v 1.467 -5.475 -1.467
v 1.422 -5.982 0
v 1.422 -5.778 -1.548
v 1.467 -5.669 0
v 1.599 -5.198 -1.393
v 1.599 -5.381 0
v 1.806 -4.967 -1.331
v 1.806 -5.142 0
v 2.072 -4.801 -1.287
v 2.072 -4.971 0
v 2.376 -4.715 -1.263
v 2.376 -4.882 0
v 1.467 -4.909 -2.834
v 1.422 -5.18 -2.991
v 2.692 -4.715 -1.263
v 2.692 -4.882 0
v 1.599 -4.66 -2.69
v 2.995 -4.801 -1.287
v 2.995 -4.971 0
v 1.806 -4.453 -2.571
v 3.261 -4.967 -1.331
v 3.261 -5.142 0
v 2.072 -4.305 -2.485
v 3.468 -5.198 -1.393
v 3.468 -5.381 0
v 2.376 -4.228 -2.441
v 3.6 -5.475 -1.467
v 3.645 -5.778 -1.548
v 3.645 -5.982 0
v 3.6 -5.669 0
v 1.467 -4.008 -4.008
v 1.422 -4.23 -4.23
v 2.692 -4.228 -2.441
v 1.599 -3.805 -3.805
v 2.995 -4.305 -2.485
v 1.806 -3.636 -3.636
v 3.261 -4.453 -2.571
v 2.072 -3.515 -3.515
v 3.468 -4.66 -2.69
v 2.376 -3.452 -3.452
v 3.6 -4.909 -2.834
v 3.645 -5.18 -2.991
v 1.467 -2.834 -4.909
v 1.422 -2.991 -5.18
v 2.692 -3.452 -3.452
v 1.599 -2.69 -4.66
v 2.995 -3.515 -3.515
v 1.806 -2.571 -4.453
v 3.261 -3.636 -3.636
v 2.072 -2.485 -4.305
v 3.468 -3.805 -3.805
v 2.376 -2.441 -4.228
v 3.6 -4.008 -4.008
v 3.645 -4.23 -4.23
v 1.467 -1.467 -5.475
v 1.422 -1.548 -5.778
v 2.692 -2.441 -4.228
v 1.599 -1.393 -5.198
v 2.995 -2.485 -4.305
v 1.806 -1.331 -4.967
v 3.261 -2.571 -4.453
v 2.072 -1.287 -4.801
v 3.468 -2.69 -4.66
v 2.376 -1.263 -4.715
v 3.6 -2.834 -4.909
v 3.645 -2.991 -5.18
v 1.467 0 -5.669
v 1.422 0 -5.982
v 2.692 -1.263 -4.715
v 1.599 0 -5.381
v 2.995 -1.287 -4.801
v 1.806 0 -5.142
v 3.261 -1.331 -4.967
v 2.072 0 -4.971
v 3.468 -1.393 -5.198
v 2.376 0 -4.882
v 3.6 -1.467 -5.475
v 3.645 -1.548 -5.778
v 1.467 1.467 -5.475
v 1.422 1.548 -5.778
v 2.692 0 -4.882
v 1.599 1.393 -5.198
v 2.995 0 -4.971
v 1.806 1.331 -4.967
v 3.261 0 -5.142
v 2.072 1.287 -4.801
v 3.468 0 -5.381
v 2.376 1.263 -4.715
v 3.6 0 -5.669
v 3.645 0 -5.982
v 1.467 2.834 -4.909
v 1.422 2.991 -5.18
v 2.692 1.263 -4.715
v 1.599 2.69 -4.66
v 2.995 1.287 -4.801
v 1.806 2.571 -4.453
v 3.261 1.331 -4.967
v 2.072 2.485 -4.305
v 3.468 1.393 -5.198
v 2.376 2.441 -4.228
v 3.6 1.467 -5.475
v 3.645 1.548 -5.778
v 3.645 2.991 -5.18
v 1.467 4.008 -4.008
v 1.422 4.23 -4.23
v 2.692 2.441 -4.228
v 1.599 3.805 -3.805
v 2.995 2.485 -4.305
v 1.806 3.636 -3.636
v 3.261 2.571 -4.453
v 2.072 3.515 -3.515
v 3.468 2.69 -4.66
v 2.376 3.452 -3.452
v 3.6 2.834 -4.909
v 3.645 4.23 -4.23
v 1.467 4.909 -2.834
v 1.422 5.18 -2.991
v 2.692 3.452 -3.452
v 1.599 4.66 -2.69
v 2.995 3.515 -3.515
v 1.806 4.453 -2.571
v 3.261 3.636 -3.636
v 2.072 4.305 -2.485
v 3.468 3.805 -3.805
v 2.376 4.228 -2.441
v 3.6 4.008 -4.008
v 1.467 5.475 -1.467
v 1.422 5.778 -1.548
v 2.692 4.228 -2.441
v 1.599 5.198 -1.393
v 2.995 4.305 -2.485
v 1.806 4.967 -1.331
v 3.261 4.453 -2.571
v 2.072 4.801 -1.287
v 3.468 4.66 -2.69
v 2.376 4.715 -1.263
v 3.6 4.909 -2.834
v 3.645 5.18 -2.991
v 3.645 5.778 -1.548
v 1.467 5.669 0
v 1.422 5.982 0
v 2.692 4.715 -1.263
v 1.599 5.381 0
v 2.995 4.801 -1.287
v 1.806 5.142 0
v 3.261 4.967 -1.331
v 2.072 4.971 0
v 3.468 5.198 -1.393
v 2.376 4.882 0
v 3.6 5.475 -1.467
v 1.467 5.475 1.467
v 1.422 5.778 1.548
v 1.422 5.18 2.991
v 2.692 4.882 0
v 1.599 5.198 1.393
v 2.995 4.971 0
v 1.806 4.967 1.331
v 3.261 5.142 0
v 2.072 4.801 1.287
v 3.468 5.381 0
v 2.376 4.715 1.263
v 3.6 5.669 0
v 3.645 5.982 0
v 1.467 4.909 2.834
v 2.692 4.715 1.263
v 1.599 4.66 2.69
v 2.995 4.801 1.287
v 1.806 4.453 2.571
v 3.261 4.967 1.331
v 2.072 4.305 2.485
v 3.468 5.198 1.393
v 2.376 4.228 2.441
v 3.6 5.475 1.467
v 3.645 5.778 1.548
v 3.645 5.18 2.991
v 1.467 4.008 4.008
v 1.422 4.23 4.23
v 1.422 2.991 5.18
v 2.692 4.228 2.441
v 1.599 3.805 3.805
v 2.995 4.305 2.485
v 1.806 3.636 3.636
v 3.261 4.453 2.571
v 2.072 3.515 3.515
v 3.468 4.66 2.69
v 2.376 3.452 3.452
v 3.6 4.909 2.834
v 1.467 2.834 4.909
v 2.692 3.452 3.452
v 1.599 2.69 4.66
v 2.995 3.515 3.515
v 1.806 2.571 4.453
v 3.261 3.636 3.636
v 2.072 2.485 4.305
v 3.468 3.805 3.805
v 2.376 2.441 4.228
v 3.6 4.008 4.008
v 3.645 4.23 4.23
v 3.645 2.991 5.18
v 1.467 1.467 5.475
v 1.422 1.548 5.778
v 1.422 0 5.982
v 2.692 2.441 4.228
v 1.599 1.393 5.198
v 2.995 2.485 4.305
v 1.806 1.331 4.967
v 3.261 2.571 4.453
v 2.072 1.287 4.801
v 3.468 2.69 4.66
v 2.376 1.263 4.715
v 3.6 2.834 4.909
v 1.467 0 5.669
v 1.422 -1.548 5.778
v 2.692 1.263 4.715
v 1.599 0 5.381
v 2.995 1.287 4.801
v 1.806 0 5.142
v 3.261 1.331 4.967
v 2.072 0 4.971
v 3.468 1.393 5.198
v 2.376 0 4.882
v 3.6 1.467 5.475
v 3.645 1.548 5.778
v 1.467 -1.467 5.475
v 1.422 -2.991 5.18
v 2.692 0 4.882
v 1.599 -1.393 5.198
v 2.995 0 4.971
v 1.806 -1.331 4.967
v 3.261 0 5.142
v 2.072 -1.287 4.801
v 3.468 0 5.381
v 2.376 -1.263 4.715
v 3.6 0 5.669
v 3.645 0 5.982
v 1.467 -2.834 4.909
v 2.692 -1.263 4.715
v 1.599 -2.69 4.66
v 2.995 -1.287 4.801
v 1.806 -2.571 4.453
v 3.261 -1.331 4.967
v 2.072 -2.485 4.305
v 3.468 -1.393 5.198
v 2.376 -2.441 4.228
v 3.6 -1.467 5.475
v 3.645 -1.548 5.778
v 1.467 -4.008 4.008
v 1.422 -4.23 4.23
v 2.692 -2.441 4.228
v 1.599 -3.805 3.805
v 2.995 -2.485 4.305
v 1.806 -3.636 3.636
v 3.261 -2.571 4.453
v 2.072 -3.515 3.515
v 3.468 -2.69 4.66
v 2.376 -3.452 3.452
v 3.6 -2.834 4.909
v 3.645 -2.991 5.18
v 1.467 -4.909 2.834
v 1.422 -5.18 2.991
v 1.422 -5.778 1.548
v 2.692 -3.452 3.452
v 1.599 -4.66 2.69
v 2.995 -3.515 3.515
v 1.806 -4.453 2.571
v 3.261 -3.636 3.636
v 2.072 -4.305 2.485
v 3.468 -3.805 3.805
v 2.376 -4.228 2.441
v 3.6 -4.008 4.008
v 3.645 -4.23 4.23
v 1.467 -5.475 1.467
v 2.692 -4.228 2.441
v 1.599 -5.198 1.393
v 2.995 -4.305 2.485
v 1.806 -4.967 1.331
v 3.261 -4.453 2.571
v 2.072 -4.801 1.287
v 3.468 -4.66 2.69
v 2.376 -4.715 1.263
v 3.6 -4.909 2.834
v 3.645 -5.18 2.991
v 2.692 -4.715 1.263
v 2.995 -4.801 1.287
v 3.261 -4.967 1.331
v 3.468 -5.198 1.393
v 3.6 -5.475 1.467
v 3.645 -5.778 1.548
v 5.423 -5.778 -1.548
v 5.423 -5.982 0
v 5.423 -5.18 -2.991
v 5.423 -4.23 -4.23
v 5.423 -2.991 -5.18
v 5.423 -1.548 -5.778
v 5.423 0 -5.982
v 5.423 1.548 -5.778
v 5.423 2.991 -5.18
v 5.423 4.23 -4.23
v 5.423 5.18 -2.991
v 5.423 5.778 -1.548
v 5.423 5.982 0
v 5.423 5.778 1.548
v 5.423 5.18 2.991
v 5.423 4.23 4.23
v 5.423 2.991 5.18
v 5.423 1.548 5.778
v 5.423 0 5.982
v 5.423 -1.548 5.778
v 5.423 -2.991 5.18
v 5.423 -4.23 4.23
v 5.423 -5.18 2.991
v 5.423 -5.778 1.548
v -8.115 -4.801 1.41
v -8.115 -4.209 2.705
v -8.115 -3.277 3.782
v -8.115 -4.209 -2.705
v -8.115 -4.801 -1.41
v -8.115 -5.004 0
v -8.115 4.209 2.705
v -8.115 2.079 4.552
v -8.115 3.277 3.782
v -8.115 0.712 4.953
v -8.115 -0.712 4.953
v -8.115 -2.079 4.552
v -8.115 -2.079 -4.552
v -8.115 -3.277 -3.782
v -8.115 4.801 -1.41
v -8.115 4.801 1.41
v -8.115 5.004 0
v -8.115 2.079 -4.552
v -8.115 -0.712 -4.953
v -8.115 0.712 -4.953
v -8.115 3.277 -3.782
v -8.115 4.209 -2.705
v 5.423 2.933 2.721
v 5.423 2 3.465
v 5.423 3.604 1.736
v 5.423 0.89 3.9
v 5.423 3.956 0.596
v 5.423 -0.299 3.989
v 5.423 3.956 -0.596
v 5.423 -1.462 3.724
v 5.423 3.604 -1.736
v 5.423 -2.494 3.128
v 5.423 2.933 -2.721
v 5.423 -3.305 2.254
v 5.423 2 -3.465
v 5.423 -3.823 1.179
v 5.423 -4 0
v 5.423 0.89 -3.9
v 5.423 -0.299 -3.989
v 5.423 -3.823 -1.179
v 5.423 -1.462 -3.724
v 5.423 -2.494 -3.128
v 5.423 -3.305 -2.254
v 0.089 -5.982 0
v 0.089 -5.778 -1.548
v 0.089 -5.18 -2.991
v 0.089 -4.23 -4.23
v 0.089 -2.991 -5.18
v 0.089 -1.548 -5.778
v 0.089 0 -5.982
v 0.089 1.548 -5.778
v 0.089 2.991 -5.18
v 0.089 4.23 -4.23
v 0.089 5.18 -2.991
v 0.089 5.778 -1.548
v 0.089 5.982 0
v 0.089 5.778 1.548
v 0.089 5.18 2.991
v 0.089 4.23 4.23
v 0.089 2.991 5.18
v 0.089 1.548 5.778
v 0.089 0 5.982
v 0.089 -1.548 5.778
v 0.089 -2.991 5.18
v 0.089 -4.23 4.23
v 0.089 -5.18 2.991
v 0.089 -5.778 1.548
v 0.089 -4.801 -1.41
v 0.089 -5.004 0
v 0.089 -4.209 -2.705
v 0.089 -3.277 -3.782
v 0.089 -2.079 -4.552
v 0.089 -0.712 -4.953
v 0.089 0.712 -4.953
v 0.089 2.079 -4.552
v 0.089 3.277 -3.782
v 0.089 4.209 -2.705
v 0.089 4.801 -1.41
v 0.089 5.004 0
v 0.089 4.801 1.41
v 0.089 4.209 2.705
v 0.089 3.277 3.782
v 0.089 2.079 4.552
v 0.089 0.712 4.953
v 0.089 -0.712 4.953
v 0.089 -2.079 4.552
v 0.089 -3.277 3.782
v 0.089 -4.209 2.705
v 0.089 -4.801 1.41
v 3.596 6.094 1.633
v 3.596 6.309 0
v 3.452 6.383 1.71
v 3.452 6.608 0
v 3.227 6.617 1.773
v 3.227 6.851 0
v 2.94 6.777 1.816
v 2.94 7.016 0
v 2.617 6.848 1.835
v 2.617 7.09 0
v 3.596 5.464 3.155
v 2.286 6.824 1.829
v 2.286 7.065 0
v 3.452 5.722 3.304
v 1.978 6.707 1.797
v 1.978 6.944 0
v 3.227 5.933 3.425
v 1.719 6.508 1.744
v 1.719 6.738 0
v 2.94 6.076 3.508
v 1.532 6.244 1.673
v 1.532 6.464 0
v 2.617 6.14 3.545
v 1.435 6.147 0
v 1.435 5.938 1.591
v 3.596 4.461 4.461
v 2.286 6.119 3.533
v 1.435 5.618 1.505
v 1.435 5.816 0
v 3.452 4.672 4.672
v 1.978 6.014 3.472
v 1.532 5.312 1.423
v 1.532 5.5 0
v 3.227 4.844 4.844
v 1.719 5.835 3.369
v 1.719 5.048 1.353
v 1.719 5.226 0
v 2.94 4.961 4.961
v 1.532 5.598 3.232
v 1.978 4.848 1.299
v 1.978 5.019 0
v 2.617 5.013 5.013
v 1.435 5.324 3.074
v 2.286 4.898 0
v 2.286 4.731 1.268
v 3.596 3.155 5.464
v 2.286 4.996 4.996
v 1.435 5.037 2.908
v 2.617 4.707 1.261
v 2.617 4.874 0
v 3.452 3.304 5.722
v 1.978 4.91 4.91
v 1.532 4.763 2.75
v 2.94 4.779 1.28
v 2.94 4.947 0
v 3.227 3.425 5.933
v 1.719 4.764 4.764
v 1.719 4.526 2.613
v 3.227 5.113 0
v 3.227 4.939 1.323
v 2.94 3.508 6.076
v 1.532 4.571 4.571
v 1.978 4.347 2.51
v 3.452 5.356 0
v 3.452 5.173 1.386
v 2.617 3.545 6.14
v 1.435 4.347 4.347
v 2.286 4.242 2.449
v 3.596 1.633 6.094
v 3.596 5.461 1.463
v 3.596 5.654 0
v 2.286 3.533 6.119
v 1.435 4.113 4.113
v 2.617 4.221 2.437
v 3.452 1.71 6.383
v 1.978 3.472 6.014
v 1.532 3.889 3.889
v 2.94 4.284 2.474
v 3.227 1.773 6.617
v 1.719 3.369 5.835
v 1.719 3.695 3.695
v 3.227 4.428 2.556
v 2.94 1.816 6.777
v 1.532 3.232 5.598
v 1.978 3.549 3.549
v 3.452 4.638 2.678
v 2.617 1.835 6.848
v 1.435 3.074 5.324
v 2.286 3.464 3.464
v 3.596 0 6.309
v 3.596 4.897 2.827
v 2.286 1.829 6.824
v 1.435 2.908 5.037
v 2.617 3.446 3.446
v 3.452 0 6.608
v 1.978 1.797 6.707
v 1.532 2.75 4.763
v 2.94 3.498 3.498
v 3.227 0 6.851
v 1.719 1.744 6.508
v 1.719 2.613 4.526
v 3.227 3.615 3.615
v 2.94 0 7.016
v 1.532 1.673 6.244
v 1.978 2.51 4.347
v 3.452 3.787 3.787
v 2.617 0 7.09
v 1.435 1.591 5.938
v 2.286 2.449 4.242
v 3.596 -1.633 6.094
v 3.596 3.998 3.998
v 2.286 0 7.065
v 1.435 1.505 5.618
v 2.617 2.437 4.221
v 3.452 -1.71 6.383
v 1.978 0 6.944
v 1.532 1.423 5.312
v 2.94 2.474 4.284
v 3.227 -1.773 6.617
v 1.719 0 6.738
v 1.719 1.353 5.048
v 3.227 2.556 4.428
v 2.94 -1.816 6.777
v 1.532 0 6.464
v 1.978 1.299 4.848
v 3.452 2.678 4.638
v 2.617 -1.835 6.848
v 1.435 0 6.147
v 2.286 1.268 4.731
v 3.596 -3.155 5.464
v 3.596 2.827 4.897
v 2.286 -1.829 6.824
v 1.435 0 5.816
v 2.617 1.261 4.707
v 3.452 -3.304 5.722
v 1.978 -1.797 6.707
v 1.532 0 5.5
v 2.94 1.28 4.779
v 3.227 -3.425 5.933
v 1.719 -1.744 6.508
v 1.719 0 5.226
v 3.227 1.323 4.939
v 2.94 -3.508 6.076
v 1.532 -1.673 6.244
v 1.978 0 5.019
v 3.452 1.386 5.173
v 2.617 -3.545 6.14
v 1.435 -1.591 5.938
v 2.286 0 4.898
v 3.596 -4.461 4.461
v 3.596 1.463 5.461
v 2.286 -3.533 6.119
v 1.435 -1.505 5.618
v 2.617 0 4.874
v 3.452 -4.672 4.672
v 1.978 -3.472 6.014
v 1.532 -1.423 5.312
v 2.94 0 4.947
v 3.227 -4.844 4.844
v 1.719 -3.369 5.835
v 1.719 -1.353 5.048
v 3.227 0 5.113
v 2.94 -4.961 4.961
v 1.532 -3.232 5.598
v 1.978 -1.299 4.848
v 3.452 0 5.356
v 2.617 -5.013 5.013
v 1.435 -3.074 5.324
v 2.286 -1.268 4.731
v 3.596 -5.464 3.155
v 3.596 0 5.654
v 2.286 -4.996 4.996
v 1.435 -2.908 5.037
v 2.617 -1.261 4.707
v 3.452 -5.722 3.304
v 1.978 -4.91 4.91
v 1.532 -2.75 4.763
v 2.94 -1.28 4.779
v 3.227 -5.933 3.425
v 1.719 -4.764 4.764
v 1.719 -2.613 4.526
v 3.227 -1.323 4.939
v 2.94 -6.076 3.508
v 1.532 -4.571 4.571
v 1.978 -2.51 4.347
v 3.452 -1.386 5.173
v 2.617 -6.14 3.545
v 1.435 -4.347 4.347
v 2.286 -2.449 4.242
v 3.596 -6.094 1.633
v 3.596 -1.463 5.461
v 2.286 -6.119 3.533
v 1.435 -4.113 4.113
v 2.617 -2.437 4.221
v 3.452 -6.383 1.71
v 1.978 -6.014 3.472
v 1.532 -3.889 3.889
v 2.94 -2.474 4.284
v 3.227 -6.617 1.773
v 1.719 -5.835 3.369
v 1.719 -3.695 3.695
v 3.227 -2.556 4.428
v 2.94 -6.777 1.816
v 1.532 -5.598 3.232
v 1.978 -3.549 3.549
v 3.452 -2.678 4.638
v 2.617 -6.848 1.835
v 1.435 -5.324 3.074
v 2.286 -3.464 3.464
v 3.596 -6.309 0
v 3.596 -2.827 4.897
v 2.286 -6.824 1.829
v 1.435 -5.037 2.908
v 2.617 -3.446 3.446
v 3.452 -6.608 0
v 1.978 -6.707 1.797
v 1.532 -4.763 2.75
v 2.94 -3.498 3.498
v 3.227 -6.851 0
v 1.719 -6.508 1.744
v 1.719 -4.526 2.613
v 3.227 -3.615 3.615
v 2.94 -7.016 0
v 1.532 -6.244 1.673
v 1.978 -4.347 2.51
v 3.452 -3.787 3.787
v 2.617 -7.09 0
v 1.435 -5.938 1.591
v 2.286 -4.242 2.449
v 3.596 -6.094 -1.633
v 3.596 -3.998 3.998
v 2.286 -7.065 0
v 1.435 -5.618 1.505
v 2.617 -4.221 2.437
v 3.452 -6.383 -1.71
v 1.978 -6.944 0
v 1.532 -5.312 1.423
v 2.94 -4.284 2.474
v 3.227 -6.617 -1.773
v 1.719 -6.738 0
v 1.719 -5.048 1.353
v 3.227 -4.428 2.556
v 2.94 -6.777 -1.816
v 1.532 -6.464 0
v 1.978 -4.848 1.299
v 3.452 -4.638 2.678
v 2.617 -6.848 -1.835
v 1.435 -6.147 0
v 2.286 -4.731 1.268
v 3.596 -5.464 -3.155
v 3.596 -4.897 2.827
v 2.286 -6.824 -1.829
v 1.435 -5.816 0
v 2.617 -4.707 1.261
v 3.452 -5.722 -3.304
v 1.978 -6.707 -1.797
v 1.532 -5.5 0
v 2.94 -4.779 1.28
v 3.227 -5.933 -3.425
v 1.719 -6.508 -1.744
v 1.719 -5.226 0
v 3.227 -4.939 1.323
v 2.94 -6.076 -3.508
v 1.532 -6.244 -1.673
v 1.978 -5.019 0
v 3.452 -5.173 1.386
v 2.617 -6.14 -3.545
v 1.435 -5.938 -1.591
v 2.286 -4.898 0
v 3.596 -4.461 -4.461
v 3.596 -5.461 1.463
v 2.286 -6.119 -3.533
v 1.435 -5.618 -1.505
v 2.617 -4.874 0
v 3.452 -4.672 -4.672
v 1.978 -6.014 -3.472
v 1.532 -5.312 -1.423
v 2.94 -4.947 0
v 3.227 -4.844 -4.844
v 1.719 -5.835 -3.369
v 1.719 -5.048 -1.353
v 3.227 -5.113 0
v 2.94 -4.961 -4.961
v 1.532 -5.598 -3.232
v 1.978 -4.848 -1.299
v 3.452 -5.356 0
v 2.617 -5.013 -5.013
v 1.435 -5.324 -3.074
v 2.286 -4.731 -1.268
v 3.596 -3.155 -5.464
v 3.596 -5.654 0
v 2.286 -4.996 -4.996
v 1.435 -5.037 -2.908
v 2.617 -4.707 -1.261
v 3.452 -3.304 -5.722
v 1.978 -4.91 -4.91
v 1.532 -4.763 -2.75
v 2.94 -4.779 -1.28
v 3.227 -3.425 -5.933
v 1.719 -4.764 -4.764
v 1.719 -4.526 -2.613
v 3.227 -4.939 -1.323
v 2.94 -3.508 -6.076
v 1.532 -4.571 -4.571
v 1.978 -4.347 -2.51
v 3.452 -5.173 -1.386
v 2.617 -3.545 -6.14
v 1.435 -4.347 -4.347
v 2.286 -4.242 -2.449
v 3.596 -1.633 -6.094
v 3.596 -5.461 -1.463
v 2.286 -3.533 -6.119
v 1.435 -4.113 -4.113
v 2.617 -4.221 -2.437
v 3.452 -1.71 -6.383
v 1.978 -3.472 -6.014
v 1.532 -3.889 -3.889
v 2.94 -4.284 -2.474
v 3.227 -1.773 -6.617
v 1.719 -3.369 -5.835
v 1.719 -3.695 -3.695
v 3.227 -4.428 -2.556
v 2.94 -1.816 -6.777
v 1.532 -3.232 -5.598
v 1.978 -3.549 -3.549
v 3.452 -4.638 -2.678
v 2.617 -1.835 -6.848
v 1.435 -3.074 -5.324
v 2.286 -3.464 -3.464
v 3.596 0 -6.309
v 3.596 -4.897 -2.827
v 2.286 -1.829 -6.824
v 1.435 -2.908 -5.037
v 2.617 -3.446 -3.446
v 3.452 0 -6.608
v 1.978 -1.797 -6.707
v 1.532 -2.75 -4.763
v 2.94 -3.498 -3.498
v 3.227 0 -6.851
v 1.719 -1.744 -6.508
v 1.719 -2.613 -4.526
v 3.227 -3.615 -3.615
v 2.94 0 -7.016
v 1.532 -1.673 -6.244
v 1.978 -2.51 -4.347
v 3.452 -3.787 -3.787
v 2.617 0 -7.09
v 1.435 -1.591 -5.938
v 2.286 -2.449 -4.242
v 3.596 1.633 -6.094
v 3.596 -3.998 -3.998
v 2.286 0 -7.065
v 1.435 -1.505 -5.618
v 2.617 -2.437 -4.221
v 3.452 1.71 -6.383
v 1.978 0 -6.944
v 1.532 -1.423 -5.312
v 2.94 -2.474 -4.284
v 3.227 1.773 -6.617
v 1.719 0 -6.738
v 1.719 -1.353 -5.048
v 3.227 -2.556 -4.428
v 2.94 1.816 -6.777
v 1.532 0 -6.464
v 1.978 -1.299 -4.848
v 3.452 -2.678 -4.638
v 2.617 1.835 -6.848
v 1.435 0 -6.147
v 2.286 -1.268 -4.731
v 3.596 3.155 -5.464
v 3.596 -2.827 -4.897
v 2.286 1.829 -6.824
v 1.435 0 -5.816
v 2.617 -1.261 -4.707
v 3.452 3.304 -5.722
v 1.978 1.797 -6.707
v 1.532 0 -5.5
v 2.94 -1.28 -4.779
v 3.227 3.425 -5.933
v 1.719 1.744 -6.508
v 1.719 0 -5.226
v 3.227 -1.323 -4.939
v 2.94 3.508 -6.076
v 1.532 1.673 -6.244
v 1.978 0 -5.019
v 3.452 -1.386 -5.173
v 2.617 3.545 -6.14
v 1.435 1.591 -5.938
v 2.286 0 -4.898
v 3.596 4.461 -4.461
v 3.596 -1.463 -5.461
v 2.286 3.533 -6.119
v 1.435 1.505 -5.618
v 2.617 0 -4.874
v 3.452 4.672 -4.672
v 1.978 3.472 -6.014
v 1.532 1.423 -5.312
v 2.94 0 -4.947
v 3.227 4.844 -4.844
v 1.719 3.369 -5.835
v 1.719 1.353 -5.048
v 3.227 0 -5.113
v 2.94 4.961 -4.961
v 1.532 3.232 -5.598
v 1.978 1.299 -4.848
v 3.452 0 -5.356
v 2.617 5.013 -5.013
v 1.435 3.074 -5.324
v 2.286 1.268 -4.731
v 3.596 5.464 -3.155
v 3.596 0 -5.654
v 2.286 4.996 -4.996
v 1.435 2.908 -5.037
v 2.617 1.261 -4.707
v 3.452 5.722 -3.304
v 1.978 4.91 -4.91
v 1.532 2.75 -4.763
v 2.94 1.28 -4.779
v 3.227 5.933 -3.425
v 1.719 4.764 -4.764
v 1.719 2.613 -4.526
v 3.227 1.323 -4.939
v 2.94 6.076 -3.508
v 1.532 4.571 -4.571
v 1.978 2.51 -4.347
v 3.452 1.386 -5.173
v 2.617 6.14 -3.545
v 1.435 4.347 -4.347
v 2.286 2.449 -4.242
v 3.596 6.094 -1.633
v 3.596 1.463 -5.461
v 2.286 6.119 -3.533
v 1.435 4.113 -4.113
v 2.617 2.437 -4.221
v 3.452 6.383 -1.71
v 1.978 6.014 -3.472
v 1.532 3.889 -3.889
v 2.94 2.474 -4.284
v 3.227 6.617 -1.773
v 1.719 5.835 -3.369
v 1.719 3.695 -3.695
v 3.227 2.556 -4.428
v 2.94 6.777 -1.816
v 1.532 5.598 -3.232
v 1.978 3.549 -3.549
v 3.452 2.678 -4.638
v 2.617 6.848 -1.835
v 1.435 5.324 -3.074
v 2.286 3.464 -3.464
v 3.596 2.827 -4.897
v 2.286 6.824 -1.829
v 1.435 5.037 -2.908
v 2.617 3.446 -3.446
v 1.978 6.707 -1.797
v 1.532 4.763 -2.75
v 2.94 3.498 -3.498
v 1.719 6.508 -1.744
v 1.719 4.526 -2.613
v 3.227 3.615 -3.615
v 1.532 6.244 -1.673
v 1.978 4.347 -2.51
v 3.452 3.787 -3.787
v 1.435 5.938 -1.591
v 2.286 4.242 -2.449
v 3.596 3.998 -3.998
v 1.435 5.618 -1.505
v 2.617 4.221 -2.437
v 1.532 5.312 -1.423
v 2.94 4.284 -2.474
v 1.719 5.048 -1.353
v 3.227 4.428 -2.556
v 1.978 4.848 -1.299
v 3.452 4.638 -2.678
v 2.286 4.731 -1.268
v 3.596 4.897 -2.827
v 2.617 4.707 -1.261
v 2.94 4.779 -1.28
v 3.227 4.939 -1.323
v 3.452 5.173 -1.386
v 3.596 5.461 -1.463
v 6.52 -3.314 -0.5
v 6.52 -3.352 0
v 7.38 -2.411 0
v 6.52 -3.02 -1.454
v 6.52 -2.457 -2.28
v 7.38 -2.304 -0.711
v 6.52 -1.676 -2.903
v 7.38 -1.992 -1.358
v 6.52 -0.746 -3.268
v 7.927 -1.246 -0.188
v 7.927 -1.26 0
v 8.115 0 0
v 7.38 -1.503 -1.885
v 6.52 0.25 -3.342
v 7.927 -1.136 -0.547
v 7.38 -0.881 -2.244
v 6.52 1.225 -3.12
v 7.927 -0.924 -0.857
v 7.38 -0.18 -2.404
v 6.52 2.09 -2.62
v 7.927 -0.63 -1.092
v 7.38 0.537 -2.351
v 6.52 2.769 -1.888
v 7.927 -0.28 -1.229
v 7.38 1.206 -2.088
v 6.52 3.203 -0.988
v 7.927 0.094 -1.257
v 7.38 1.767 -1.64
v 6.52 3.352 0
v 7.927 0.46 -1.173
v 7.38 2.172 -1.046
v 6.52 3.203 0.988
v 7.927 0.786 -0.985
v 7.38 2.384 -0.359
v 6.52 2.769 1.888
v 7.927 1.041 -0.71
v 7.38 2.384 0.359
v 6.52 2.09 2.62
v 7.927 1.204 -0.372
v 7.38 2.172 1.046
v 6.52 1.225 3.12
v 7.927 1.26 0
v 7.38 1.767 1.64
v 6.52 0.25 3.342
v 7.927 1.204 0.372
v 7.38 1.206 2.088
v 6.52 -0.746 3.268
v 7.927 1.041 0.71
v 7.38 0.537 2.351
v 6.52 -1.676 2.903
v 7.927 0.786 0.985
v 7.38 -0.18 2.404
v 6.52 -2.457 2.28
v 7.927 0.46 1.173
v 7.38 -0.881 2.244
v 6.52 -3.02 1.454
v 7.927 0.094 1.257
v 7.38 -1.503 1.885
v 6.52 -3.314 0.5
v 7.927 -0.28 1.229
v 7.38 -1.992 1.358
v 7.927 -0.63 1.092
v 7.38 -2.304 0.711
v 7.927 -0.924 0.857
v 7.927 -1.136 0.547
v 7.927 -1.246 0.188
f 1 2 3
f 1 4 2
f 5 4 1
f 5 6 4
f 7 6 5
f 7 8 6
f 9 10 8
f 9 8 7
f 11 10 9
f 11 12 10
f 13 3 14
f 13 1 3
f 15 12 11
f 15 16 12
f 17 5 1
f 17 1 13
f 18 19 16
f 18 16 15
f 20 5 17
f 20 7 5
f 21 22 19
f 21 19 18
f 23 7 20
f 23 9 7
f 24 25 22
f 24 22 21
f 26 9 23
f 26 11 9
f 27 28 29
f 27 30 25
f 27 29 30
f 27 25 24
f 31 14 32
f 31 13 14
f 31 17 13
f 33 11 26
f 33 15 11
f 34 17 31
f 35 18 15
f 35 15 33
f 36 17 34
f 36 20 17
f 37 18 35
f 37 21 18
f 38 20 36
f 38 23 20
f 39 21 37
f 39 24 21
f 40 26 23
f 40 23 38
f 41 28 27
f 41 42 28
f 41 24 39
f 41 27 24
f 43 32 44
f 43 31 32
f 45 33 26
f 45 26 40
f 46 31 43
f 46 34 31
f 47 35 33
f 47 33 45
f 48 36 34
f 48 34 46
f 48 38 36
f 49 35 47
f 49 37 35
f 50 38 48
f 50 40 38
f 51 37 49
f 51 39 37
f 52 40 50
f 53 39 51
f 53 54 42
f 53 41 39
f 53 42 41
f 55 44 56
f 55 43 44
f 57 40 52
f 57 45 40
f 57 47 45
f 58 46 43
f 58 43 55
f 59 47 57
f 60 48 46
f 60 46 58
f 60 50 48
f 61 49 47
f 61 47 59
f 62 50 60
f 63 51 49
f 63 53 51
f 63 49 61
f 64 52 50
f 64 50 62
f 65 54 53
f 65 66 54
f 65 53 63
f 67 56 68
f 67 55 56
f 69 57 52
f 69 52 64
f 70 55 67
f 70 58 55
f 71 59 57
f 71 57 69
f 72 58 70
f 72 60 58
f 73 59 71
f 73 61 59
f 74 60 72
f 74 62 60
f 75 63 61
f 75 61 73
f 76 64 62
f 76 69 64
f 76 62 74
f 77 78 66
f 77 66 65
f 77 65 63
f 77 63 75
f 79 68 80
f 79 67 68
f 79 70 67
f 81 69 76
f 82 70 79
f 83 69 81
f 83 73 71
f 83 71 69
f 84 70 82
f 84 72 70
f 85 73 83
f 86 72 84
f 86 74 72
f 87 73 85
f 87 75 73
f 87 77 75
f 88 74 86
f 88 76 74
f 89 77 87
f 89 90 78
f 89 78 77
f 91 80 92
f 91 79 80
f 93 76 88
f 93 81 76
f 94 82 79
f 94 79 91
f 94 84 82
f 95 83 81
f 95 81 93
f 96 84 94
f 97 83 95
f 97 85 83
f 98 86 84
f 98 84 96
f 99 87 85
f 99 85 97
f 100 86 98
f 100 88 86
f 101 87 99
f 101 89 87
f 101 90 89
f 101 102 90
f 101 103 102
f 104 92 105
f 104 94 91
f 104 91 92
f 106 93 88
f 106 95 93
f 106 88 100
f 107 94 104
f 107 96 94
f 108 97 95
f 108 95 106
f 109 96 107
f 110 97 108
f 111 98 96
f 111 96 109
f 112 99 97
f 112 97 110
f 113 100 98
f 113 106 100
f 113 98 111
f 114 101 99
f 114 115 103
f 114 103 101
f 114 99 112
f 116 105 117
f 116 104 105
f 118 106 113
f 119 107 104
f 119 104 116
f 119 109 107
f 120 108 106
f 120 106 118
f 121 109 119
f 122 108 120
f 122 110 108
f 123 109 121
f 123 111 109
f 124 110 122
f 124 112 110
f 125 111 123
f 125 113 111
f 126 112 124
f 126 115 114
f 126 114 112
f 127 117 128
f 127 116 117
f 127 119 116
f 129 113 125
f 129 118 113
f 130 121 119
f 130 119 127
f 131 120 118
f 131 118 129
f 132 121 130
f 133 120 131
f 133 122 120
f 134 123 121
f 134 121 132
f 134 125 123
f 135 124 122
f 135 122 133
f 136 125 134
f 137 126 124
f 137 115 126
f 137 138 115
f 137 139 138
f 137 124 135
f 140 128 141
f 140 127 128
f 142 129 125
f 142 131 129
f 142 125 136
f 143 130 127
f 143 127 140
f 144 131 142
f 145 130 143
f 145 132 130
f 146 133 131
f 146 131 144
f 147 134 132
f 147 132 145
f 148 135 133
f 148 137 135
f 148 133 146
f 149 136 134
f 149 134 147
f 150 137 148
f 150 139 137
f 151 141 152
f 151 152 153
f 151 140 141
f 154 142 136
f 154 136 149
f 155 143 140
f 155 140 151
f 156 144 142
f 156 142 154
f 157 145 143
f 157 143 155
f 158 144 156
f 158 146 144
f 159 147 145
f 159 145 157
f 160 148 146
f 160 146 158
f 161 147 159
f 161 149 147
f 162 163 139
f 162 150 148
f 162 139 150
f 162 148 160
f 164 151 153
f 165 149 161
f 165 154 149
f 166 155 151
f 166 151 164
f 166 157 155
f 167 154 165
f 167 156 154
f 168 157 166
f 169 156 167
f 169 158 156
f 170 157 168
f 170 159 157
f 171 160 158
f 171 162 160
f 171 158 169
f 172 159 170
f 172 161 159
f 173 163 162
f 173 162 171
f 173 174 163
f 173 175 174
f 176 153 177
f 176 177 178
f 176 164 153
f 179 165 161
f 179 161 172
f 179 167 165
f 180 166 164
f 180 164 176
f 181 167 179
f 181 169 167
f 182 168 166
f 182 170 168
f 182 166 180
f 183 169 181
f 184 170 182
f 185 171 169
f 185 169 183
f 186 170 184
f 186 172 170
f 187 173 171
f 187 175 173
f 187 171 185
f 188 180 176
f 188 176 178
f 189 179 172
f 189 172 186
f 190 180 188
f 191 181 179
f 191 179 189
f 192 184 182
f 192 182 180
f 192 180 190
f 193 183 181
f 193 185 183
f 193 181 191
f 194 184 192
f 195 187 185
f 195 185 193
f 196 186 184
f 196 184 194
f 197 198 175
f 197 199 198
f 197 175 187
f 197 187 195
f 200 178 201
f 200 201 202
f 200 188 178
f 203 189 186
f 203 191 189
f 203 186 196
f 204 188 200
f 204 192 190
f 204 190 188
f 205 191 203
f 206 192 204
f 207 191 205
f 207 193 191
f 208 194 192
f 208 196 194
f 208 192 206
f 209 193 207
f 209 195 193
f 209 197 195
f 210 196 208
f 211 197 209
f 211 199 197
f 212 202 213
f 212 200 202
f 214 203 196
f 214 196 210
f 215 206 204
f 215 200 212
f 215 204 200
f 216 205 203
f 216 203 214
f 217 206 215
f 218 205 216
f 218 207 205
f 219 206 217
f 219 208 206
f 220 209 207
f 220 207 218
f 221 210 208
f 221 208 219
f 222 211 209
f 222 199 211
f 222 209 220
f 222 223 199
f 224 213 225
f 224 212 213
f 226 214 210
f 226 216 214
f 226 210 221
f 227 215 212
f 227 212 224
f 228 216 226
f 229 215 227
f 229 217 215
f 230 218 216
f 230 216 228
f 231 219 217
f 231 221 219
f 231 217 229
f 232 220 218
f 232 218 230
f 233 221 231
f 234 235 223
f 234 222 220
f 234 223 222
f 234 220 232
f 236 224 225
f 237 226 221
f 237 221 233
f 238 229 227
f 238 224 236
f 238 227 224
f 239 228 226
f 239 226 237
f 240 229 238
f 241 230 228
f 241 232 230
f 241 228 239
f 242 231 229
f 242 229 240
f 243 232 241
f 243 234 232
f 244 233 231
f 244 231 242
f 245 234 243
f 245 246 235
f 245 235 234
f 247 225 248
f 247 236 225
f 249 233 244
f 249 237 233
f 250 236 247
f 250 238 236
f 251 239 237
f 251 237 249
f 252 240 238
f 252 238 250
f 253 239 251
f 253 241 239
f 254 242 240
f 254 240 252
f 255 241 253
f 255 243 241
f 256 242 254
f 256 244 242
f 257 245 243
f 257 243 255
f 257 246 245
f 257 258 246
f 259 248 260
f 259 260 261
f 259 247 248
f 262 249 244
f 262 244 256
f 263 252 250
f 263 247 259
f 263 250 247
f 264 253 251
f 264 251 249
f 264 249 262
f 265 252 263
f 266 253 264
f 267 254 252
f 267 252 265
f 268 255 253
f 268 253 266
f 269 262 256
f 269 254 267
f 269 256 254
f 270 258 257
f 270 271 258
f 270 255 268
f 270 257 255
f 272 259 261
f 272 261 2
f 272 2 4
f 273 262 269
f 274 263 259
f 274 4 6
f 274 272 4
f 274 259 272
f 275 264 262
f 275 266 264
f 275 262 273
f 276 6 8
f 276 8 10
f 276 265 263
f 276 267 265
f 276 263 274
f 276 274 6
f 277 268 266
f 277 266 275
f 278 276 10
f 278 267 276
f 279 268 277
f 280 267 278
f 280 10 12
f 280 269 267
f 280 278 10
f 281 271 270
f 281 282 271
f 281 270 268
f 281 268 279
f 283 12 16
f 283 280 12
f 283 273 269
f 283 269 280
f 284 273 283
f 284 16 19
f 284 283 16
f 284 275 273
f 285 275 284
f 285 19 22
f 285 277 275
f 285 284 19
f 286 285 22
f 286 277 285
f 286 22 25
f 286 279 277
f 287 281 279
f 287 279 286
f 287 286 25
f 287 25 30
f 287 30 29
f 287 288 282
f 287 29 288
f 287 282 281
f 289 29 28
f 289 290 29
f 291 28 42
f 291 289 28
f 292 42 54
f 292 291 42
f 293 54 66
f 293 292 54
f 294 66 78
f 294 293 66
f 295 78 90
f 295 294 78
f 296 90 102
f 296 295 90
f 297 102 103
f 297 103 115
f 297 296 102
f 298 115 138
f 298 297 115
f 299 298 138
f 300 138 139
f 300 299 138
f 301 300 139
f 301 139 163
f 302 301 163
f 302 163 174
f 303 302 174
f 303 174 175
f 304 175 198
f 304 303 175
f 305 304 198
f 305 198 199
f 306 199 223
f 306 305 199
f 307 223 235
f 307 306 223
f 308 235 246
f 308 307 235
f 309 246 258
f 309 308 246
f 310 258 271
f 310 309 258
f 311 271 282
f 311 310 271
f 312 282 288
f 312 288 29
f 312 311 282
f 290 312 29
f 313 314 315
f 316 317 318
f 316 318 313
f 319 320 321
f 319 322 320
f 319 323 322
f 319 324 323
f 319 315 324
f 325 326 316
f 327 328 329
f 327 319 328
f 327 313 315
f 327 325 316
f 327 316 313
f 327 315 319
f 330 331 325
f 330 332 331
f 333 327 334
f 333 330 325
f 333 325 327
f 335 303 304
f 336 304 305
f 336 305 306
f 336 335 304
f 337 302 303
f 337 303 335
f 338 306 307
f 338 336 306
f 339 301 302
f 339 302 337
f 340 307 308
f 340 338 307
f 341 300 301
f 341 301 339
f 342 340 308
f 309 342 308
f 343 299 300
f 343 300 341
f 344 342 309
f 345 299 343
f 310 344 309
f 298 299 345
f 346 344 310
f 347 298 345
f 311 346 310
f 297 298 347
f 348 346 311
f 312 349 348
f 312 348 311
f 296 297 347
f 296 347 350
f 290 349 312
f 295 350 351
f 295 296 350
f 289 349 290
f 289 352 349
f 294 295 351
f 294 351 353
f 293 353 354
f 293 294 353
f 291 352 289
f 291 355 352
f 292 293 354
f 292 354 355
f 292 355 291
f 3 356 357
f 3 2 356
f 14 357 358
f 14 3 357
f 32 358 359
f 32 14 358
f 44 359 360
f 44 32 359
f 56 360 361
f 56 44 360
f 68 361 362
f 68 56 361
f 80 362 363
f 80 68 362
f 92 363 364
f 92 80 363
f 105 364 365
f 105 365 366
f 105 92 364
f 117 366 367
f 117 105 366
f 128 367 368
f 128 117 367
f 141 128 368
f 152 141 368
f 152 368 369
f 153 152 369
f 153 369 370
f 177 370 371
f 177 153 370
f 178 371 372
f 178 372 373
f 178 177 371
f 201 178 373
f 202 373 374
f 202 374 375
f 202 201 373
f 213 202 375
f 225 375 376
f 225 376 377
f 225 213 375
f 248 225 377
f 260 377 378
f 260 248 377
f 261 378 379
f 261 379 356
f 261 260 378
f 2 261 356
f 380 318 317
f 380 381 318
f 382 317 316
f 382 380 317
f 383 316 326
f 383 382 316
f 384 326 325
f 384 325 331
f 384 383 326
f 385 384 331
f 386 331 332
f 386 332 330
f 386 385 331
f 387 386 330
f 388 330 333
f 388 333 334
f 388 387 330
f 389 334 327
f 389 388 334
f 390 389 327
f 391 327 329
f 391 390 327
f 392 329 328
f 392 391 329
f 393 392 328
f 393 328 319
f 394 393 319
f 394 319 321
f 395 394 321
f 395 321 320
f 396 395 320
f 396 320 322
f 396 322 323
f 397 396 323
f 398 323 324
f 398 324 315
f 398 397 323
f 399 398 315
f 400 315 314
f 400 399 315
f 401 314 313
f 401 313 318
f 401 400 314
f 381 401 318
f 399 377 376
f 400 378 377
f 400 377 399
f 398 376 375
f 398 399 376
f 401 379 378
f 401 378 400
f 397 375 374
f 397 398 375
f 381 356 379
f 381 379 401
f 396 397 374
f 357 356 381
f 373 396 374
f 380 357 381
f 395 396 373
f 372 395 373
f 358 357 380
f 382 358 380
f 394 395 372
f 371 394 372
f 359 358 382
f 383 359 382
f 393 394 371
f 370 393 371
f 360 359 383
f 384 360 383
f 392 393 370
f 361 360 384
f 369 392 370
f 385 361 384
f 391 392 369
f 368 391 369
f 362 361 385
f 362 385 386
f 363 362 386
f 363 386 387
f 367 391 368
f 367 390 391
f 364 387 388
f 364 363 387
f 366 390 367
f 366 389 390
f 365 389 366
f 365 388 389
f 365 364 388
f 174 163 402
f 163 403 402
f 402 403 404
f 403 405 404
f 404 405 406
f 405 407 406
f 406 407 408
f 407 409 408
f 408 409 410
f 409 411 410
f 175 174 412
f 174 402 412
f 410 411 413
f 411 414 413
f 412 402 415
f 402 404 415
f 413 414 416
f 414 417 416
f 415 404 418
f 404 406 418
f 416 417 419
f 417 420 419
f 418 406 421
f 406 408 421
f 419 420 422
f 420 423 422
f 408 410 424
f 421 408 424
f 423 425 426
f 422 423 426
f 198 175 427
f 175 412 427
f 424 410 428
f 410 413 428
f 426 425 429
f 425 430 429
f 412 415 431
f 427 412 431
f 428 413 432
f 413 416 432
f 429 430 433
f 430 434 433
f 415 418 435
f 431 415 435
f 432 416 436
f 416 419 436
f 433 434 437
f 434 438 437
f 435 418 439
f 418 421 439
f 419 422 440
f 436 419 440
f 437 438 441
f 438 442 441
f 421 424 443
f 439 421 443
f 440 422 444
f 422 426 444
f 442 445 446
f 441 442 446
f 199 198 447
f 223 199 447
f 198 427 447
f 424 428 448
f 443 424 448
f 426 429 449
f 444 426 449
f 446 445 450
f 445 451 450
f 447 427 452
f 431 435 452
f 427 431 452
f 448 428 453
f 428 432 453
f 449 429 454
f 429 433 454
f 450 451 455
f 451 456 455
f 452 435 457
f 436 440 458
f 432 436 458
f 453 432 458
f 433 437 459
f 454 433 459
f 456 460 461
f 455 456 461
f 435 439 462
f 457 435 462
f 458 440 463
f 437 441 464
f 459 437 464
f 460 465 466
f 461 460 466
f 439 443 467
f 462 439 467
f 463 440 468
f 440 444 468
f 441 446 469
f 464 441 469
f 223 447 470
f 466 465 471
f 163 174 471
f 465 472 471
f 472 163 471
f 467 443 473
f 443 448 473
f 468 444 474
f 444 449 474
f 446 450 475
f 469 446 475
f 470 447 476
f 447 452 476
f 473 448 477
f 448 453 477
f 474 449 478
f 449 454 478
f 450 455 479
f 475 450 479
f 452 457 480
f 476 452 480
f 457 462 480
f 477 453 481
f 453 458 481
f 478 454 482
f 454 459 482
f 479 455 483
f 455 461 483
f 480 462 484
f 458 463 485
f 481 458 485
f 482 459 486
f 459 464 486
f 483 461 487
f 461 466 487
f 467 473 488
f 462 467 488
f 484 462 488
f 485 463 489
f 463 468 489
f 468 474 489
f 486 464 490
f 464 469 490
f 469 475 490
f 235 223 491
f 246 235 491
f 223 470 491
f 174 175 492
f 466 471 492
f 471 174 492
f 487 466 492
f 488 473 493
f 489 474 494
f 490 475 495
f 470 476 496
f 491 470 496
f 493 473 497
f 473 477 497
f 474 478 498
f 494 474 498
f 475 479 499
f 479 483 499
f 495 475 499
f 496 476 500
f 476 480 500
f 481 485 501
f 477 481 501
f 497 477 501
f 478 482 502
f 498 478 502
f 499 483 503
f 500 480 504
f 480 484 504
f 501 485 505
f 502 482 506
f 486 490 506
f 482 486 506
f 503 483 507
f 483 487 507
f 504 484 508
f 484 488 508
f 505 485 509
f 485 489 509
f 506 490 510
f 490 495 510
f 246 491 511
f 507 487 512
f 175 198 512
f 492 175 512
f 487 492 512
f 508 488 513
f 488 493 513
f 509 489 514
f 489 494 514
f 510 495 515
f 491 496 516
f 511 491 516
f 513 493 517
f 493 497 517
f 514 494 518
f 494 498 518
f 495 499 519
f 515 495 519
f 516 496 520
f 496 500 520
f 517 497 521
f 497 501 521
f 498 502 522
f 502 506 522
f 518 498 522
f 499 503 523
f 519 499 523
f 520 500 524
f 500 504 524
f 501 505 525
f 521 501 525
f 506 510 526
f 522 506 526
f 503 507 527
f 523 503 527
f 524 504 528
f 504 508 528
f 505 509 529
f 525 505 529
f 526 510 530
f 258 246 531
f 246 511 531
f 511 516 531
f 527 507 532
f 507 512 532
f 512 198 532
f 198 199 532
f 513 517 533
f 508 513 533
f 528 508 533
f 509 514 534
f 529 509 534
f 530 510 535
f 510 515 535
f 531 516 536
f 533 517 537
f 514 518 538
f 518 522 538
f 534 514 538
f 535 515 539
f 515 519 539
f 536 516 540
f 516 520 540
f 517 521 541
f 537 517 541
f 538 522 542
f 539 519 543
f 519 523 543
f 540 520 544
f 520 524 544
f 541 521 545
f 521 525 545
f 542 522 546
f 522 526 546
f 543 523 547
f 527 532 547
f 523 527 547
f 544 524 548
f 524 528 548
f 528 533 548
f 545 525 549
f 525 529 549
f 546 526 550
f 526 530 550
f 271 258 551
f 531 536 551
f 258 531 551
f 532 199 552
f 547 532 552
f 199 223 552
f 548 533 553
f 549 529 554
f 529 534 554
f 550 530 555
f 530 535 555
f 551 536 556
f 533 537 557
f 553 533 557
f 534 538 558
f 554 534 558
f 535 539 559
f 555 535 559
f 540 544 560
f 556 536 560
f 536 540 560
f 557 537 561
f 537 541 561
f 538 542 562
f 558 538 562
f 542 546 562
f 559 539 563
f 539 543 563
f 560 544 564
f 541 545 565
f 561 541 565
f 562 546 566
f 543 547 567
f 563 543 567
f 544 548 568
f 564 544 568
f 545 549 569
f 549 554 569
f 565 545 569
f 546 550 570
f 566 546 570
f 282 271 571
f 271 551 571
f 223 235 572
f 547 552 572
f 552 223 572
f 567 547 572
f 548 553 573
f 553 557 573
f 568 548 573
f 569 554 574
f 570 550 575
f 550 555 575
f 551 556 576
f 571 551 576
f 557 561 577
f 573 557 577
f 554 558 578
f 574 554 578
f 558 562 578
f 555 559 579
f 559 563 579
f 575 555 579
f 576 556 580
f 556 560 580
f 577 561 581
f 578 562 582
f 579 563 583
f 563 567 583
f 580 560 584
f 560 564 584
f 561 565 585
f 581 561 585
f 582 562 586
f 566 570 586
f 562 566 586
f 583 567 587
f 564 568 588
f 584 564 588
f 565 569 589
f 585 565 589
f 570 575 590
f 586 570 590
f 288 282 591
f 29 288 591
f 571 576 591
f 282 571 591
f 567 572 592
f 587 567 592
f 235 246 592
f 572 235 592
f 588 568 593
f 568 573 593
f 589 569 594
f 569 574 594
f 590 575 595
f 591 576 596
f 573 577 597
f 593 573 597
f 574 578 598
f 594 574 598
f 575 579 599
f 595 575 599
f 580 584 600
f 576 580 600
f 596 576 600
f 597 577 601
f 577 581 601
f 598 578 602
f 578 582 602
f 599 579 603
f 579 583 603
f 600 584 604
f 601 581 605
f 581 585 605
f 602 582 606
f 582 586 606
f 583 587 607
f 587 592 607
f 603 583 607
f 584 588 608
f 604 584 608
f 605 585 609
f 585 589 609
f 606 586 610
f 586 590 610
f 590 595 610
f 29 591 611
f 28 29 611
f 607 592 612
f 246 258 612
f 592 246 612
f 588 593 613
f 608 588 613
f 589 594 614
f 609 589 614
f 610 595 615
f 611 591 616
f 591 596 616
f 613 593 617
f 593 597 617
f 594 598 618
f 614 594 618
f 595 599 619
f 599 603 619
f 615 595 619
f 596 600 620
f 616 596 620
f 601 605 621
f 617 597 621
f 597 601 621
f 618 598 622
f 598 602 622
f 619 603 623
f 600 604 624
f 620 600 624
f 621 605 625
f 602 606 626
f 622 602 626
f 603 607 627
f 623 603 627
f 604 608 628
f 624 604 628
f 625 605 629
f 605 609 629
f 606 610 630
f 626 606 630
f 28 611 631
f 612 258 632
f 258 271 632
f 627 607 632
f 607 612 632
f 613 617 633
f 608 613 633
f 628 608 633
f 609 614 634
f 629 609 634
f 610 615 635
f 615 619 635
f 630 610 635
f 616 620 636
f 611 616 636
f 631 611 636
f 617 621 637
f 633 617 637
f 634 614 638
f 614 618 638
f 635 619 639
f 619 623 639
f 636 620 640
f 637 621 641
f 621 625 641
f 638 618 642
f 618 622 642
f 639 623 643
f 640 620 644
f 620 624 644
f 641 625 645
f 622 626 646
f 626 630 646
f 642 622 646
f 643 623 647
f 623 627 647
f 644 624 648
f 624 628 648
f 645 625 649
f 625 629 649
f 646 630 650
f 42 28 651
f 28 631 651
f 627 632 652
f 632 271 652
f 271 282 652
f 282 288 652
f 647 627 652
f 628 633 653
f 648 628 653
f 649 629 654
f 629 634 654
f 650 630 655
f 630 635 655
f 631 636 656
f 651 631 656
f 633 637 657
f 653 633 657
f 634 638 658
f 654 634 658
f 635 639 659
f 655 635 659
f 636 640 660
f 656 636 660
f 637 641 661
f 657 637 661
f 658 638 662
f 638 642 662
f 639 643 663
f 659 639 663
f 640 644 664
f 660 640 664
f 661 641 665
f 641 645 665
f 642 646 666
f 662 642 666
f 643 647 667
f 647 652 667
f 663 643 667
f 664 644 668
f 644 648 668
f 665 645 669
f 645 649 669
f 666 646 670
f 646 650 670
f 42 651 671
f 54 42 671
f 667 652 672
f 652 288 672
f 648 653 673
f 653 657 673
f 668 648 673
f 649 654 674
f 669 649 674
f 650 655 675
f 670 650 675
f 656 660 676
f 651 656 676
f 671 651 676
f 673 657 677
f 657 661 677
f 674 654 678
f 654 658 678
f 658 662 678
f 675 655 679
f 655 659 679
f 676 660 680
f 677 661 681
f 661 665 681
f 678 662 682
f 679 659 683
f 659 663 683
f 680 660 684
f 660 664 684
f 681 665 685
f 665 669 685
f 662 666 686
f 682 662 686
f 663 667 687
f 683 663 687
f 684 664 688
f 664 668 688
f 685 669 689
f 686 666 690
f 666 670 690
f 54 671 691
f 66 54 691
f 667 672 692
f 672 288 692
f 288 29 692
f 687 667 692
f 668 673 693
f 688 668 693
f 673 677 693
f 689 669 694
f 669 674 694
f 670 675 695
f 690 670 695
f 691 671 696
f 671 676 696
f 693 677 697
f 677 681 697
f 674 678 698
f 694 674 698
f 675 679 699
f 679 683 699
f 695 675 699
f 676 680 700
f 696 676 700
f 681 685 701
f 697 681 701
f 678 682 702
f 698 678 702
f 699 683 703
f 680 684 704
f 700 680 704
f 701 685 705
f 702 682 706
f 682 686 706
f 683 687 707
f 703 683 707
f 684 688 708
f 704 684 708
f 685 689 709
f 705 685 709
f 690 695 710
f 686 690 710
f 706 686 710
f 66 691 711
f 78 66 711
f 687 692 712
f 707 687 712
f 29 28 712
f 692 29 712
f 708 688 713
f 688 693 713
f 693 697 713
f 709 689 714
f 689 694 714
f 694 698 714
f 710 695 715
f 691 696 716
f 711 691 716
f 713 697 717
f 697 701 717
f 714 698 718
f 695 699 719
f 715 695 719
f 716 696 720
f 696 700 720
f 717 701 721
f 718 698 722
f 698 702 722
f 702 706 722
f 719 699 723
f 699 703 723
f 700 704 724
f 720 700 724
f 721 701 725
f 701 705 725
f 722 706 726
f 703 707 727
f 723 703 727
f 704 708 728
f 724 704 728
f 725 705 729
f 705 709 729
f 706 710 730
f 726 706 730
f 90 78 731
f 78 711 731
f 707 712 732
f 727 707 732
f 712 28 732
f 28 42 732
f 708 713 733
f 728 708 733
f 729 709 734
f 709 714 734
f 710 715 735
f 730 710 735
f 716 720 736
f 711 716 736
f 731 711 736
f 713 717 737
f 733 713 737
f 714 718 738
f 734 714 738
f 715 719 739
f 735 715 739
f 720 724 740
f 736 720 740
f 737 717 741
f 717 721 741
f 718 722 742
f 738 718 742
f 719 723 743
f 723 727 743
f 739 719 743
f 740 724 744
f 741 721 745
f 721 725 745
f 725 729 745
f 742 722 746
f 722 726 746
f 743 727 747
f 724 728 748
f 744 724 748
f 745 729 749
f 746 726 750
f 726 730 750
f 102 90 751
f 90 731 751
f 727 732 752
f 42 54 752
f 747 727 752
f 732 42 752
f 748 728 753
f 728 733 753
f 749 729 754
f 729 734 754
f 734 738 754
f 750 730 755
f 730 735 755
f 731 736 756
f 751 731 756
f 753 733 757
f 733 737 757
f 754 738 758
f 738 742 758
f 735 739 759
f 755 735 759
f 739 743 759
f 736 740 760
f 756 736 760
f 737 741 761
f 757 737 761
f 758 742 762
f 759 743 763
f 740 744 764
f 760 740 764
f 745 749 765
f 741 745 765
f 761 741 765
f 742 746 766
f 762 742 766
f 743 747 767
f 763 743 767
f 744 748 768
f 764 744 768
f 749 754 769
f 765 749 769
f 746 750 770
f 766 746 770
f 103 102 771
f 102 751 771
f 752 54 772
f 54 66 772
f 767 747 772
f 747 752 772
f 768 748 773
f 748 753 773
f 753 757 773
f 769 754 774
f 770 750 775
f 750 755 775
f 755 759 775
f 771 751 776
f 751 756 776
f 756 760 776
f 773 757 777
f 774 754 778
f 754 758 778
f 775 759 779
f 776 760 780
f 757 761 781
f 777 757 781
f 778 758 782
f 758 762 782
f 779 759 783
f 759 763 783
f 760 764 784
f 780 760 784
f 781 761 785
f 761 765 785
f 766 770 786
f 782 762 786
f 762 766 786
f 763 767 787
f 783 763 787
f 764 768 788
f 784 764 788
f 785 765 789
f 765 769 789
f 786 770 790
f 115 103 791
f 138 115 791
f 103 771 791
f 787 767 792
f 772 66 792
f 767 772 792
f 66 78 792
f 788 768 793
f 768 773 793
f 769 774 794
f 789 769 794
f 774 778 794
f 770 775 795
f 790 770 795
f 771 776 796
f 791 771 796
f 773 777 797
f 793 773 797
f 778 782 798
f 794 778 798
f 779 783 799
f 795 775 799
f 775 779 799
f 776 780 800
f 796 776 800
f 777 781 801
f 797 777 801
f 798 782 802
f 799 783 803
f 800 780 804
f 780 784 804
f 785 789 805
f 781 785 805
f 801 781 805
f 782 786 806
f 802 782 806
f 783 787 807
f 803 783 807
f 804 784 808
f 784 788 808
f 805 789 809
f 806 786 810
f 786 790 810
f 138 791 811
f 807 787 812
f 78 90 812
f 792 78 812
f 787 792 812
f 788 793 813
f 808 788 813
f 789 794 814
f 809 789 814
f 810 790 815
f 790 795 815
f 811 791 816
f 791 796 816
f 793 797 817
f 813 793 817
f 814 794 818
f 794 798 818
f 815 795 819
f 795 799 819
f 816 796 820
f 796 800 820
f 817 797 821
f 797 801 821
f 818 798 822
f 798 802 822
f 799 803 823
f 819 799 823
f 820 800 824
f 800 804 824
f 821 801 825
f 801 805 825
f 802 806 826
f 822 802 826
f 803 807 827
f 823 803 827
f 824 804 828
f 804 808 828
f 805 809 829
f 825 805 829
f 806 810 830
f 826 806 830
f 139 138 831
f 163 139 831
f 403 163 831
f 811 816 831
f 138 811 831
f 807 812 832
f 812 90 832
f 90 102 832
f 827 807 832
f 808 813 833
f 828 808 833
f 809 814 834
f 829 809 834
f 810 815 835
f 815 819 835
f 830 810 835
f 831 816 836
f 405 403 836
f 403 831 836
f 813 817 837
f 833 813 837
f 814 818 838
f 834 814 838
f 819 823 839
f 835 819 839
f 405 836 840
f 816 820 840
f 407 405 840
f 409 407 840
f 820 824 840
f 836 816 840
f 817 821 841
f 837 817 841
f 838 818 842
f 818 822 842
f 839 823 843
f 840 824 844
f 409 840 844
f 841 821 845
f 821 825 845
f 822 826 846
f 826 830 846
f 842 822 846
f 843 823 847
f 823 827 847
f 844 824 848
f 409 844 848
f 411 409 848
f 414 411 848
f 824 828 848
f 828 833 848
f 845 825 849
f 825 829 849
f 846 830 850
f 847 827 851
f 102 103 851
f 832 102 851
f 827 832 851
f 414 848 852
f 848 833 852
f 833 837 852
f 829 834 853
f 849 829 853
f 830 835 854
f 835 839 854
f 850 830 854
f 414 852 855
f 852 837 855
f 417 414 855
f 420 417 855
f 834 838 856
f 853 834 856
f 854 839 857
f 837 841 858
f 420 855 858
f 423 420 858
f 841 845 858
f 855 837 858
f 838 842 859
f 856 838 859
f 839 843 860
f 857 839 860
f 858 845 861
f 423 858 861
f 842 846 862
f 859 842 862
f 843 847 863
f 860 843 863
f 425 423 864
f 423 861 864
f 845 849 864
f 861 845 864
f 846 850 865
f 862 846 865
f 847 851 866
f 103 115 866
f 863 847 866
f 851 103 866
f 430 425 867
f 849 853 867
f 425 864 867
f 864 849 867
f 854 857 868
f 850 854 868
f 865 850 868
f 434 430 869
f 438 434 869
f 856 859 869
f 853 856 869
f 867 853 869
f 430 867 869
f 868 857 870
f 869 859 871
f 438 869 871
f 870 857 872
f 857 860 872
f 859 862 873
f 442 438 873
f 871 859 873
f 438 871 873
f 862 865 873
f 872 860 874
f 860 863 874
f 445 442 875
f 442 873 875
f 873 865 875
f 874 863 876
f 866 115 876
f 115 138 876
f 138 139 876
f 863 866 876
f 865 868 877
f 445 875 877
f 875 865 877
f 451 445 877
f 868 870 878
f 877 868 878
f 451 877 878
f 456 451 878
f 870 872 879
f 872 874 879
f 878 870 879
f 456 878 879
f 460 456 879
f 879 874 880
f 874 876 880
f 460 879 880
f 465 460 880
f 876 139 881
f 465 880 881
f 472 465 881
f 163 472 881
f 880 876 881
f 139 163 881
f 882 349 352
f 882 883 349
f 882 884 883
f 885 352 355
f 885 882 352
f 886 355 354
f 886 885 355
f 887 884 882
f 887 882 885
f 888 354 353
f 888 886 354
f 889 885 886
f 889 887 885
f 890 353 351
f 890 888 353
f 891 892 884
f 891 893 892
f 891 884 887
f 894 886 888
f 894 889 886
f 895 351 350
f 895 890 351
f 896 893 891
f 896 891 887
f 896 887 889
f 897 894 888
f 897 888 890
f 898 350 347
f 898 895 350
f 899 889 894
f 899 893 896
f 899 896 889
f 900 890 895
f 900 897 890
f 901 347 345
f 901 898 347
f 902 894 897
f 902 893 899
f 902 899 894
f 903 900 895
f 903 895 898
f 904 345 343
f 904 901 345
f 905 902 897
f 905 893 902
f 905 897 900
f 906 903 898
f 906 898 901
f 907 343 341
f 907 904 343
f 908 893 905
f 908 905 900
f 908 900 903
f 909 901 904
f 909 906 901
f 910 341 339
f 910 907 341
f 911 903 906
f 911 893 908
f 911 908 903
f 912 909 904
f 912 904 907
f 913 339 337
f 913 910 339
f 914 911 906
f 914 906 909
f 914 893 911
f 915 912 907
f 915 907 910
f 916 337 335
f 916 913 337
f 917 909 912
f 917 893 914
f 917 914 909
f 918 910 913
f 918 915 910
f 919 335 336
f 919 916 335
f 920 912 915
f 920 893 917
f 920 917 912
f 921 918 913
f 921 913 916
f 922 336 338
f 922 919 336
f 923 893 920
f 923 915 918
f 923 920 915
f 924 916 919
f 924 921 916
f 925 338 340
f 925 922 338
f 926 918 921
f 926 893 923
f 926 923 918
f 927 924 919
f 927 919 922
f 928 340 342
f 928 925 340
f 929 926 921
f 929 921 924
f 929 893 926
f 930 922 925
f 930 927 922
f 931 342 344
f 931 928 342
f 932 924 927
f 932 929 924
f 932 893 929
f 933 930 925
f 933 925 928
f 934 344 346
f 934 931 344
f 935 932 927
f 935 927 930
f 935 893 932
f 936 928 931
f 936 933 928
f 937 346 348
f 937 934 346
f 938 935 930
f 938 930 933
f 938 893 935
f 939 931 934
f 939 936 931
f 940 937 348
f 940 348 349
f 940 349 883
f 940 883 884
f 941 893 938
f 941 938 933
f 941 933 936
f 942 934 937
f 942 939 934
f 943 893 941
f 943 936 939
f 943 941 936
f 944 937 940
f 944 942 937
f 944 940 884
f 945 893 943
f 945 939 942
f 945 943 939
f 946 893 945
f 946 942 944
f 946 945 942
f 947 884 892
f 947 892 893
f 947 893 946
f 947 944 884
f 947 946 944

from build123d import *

# Parameters (mm, degrees)
SKETCH2_R = 1.11125


with BuildPart() as part:
    # Sketch1 → Revolve1 (revolve)
    with BuildSketch(Plane.XY, mode=Mode.PRIVATE) as revolve1_sk:
        with BuildLine():
            Line((-8.1153, 0), (-8.1153, 5.0038))
            Line((-8.1153, 5.0038), (0.0889, 5.0038))
            Line((0.0889, 5.0038), (0.0889, 5.9817))
            Line((0.0889, 5.9817), (1.4224, 5.9817))
            ThreePointArc((1.4224, 5.9817), (2.53365, 4.87045), (3.6449, 5.9817))
            Line((3.6449, 5.9817), (5.4229, 5.9817))
            Line((5.4229, 5.9817), (5.4229, 4.0005))
            ThreePointArc((5.4229, 4.0005), (7.379515264, 2.411069162), (8.1153, 0))
            Line((8.1153, 0), (-8.1153, 0))
        make_face()
    revolve(revolve1_sk.sketch.rotate(Axis((-8.1153, 0, 0), (1, 0, 0)), 180), axis=Axis((-8.1153, 0, 0), (1, 0, 0)))


with BuildPart() as body_2:
    # Sketch2 → Revolve2 (revolve)
    with BuildSketch(Plane.XY):
        with Locations((2.53365, 5.9817)):
            Circle(SKETCH2_R)
    revolve(axis=Axis((-8.1153, 0, 0), (1, 0, 0)))


solid = Compound([part.part, body_2.part])
